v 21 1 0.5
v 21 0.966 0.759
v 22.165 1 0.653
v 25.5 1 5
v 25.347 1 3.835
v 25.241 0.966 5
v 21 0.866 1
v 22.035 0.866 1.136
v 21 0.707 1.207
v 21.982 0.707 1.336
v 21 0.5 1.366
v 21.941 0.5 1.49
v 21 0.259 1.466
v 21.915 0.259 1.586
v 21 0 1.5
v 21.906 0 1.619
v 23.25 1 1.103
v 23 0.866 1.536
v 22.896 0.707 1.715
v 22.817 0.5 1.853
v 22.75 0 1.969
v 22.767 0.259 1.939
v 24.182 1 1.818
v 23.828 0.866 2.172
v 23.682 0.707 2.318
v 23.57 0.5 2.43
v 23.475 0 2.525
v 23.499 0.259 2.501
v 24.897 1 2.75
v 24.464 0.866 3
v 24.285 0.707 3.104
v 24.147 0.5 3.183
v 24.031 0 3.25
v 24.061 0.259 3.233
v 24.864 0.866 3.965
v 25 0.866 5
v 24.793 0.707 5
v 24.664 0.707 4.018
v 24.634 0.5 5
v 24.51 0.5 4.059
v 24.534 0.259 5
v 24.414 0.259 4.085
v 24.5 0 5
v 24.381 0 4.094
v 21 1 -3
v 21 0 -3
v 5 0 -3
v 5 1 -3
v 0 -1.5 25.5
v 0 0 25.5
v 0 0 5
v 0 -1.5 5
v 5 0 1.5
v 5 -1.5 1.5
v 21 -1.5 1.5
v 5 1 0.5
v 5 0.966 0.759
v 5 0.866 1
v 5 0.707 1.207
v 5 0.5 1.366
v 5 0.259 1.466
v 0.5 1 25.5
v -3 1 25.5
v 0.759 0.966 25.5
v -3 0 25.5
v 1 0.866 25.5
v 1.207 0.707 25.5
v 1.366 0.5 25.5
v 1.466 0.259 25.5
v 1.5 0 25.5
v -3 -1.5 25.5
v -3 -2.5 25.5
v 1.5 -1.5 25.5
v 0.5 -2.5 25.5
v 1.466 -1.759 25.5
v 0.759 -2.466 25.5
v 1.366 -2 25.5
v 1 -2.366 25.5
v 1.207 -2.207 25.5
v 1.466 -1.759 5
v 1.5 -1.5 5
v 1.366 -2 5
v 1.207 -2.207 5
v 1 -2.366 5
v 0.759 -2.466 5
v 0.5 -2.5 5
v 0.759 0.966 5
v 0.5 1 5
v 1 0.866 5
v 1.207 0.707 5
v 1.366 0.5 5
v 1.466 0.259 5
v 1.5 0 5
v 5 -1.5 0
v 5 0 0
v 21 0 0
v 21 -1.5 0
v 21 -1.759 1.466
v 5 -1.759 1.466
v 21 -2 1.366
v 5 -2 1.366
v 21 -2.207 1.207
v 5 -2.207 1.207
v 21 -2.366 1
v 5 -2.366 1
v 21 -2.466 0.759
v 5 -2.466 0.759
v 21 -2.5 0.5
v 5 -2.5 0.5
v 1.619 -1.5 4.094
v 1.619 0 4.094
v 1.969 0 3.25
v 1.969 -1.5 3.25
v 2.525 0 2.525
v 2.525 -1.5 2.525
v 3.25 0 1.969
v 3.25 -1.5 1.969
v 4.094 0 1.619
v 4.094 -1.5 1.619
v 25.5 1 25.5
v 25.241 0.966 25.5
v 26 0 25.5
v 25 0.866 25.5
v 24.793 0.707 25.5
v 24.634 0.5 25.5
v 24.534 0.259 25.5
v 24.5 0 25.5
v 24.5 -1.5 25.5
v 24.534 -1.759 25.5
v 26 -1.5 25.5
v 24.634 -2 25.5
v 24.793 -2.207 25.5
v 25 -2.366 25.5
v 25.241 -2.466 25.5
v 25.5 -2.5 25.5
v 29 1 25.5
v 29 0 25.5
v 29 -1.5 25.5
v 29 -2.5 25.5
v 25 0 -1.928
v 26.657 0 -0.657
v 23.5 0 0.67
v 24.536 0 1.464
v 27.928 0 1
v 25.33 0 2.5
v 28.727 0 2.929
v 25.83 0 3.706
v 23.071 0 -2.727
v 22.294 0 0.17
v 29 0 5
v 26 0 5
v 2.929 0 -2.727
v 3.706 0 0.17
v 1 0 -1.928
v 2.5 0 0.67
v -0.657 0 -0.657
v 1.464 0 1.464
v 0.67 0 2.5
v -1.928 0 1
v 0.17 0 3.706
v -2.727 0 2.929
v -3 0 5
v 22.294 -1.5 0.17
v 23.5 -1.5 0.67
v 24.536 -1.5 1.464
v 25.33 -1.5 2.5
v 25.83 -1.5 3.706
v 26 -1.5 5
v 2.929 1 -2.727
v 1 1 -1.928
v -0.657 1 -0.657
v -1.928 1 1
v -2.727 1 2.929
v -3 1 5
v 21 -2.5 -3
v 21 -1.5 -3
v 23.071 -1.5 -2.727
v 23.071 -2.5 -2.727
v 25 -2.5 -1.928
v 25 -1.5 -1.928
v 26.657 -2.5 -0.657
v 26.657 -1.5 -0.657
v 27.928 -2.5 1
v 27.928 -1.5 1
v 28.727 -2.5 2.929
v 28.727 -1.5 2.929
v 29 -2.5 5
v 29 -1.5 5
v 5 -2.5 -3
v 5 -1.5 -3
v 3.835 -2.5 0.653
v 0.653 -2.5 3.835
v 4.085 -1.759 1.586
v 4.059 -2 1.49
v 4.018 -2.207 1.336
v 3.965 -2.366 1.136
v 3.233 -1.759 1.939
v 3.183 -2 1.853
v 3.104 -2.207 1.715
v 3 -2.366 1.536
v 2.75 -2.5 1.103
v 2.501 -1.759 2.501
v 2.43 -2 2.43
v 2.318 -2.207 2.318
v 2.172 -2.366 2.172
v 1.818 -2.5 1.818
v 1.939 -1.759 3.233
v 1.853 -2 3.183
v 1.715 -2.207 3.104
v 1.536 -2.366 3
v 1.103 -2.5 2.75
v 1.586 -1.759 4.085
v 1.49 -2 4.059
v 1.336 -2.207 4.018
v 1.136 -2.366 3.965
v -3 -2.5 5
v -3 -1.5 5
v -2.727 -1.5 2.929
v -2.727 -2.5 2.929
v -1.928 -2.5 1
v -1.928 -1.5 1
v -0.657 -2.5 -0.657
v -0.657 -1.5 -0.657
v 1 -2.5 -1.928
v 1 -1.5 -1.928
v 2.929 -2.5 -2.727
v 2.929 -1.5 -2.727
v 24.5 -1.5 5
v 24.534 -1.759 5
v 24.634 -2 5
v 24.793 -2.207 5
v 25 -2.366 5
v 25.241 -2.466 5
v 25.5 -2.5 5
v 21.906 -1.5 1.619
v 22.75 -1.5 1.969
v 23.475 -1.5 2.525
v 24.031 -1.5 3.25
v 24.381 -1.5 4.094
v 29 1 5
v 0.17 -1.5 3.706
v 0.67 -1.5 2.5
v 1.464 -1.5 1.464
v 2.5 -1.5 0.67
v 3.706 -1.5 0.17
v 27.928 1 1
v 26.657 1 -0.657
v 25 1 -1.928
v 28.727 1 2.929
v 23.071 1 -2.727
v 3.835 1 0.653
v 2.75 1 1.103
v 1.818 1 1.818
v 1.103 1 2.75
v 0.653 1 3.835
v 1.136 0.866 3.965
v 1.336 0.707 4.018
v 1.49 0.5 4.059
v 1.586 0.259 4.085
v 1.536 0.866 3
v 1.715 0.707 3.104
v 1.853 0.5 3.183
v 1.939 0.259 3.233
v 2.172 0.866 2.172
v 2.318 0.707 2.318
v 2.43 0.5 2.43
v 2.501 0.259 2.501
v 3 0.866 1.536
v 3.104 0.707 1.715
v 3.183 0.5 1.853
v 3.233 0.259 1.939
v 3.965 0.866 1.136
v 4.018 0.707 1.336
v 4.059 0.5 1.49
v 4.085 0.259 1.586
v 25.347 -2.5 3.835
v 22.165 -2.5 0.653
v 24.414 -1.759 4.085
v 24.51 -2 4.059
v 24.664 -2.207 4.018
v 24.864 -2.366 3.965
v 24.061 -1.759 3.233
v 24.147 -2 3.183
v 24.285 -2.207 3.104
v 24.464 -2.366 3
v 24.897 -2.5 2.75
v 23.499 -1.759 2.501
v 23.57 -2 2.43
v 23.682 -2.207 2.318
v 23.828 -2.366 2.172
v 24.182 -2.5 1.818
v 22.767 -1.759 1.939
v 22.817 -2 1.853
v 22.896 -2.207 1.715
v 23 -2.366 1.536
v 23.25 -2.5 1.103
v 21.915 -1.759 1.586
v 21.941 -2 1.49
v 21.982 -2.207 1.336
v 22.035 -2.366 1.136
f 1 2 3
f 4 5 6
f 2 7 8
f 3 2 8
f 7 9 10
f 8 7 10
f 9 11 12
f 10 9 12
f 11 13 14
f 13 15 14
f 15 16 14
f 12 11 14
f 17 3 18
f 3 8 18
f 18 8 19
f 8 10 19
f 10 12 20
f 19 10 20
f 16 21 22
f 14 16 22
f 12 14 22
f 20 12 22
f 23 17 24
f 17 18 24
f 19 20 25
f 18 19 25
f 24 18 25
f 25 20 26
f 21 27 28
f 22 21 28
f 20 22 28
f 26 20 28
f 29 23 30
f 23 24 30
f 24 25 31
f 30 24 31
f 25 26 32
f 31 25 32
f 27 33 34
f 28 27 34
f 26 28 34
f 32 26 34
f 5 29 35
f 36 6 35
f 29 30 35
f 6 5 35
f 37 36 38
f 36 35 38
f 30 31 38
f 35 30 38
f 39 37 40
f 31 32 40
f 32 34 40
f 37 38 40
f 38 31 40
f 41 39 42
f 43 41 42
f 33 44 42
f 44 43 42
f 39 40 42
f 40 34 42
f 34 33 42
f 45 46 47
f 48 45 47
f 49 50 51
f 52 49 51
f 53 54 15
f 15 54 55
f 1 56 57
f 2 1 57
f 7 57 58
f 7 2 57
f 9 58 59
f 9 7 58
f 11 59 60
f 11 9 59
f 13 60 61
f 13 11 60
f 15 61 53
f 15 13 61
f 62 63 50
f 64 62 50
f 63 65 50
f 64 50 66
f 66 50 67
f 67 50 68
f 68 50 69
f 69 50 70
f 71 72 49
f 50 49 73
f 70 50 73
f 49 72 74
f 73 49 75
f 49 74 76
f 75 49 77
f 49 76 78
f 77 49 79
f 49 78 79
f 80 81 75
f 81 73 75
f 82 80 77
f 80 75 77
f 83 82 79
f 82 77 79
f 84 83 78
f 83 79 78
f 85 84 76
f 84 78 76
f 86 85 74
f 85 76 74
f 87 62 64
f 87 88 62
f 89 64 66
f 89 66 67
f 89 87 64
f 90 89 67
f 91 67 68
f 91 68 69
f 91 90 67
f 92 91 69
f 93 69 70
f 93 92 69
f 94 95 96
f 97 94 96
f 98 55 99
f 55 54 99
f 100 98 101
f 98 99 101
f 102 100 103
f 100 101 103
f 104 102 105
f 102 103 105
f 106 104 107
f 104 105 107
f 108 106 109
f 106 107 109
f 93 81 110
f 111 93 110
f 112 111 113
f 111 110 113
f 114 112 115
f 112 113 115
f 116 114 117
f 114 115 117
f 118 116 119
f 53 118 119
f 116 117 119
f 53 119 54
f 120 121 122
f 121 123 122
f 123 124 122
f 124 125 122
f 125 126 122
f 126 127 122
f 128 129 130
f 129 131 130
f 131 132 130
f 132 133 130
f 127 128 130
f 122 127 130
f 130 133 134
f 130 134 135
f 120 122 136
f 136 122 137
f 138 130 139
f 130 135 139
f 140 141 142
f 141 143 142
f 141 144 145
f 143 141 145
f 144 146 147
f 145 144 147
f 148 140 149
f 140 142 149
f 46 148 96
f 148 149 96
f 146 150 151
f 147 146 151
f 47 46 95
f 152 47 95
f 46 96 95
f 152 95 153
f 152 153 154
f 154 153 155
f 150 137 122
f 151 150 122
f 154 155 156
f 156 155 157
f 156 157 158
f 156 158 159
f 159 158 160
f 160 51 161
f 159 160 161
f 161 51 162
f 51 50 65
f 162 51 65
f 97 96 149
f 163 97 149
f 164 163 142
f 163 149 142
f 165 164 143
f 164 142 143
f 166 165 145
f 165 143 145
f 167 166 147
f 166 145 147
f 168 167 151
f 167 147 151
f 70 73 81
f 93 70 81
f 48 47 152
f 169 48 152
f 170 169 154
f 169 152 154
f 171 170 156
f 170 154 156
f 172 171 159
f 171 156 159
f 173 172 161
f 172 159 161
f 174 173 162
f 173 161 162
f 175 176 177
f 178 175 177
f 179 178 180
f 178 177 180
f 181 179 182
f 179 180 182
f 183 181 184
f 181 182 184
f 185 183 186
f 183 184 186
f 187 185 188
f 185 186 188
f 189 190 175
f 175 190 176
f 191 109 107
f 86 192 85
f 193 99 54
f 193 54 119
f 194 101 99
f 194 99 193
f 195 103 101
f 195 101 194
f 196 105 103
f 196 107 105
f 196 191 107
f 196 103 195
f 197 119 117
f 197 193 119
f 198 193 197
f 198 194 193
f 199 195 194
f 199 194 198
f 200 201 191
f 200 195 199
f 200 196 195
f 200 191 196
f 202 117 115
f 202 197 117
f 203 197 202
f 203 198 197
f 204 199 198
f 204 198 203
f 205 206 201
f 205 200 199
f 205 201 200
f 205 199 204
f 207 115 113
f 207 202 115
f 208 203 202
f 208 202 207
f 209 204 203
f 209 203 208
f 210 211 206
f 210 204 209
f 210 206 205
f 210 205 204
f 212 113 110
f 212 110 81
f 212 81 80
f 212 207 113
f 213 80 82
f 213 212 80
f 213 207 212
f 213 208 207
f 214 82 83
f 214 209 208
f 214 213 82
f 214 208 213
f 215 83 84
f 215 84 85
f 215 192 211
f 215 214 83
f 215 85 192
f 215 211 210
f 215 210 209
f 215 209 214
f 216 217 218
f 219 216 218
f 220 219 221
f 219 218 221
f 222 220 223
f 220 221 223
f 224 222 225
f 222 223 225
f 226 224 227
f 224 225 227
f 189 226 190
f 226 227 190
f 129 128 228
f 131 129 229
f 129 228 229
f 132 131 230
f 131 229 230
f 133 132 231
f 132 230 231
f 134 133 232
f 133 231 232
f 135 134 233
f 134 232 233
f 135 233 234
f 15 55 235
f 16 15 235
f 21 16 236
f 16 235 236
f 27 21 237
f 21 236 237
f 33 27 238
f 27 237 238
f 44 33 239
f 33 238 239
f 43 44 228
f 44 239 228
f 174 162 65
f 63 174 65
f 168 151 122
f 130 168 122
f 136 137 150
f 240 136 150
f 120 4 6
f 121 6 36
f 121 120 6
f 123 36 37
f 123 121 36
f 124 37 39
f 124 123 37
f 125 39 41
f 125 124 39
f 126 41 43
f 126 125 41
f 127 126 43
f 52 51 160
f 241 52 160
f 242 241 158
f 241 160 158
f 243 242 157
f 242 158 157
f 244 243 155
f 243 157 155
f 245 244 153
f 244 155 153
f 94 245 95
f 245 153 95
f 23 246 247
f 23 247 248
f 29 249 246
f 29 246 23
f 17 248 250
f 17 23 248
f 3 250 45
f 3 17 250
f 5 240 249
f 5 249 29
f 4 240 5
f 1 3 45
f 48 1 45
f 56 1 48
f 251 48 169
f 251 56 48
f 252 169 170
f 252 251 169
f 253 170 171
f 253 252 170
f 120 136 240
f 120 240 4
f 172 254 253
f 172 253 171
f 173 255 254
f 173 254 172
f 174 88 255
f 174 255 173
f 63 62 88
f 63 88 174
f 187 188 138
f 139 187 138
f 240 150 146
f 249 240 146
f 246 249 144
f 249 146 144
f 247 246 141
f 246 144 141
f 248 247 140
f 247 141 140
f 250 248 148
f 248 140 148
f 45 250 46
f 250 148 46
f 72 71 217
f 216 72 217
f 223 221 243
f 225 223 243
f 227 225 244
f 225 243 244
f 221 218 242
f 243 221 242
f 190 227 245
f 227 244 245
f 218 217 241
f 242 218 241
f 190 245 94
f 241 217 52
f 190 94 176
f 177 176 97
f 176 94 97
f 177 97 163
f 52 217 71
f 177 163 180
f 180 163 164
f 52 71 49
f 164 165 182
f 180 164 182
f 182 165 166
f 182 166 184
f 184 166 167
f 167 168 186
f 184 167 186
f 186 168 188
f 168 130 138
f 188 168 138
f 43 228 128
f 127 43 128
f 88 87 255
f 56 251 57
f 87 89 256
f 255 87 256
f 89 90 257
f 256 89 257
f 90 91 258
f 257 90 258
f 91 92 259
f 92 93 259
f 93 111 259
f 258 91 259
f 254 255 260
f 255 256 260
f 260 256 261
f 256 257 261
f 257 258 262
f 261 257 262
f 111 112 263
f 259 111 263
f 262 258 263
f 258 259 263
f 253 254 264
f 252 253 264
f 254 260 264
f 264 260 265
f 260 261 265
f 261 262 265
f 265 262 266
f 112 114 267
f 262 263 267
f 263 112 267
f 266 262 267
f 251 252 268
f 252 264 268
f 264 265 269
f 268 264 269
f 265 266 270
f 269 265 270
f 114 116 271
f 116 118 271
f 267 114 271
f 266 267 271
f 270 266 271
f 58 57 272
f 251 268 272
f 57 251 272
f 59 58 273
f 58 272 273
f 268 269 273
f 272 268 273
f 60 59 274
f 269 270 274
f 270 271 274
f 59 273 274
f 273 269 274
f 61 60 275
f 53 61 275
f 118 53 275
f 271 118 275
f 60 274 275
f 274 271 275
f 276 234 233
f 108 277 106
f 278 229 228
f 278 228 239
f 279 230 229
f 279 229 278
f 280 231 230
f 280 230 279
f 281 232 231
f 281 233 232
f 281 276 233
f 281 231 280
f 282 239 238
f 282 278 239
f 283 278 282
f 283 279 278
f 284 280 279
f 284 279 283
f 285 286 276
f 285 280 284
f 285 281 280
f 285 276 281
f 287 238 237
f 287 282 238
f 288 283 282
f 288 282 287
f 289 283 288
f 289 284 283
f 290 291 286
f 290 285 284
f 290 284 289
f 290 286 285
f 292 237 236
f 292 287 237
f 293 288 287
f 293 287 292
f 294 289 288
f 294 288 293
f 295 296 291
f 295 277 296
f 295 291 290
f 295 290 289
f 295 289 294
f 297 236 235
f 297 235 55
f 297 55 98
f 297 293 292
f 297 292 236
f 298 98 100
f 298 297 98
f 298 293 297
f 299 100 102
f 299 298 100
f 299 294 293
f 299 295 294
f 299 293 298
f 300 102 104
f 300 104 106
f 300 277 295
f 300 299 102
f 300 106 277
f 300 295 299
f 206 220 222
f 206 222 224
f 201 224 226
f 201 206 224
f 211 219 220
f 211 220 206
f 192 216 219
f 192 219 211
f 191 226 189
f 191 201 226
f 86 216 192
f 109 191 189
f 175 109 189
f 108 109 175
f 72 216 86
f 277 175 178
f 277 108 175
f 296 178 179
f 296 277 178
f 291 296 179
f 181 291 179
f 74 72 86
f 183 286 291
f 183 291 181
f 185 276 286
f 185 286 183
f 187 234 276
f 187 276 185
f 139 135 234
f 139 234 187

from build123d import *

# Parameters (mm, degrees)
F1_DEPTH = 1.5
F3_DEPTH = 1
F5_DEPTH = 1
F6_R     = 0.99999


# Not quite as in the source:
# - a fillet or chamfer is up to 0.001 mm smaller than in the source, because OpenCascade refuses the exact size
# - ends of sketch curves that miss each other by under 0.0002 mm in the source are joined


with BuildPart() as f1:
    # F0 (on Front) → F1 (new body)
    with BuildSketch(Plane.XZ):
        with BuildLine():
            Line((1.5, 25.5), (0, 25.5))
            Line((0, 25.5), (0, 5))
            ThreePointArc((0, 5), (1.4644660941, 1.4644660941), (5, 0))
            Line((5, 0), (21, 0))
            ThreePointArc((21, 0), (24.5355339059, 1.4644660941), (26, 5))
            Line((26, 5), (26, 25.5))
            Line((26, 25.5), (24.5, 25.5))
            Line((24.5, 25.5), (24.5, 5))
            ThreePointArc((24.5, 5), (23.4748737342, 2.5251262658), (21, 1.5))
            Line((21, 1.5), (5, 1.5))
            ThreePointArc((5, 1.5), (2.5251262658, 2.5251262658), (1.5, 5))
            Line((1.5, 5), (1.5, 25.5))
        make_face()
    extrude(amount=F1_DEPTH)

    # F2 (on face) → F3 (join)
    with BuildSketch(Plane.XZ.offset(1.5)):
        with BuildLine():
            Line((1.5, 5), (1.5, 25.5))
            Line((1.5, 25.5), (-3, 25.5))
            Line((-3, 25.5), (-3, 4.9999991806))
            ThreePointArc((-3, 4.9999991806), (-0.6568544895, -0.6568544895), (4.9999991806, -3))
            Line((4.9999991806, -3), (21, -3))
            ThreePointArc((21, -3), (26.6568542495, -0.6568542495), (29, 5))
            Line((29, 5), (29, 25.5))
            Line((29, 25.5), (24.5, 25.5))
            Line((24.5, 25.5), (24.5, 5))
            ThreePointArc((24.5, 5), (23.4748737342, 2.5251262658), (21, 1.5))
            Line((21, 1.5), (5, 1.5))
            ThreePointArc((5, 1.5), (2.5251257362, 2.5251263156), (1.5, 5))
        make_face()
    extrude(amount=F3_DEPTH)

    # F4 (on face) → F5 (join)
    with BuildSketch(Plane(origin=(0, 0, 0), x_dir=(-1, 0, 0), z_dir=(0, 1, 0))):
        with BuildLine():
            Line((-24.5, 5), (-24.5, 25.5))
            Line((-24.5, 25.5), (-29, 25.5))
            Line((-29, 25.5), (-29, 5))
            ThreePointArc((-29, 5), (-26.6568542495, -0.6568542495), (-21, -3))
            Line((-21, -3), (-5, -3))
            ThreePointArc((-5, -3), (0.6568542495, -0.6568542495), (3, 5))
            Line((3, 5), (3, 25.5))
            Line((3, 25.5), (-1.5, 25.5))
            Line((-1.5, 25.5), (-1.5, 5))
            ThreePointArc((-1.5, 5), (-2.5251262658, 2.5251262658), (-5, 1.5))
            Line((-5, 1.5), (-21, 1.5))
            ThreePointArc((-21, 1.5), (-23.4748737342, 2.5251262658), (-24.5, 5))
        make_face()
    extrude(amount=F5_DEPTH)

    # F6 (radius 1 in the source; OpenCascade refuses exactly that, so slightly less here)
    f6_edges = [f1.edges().sort_by_distance(p)[0] for p in [
        (23.474874, 1, 2.525126),
        (24.5, -2.5, 15.25),
    ]]
    fillet(f6_edges, radius=F6_R)


solid = f1.part
